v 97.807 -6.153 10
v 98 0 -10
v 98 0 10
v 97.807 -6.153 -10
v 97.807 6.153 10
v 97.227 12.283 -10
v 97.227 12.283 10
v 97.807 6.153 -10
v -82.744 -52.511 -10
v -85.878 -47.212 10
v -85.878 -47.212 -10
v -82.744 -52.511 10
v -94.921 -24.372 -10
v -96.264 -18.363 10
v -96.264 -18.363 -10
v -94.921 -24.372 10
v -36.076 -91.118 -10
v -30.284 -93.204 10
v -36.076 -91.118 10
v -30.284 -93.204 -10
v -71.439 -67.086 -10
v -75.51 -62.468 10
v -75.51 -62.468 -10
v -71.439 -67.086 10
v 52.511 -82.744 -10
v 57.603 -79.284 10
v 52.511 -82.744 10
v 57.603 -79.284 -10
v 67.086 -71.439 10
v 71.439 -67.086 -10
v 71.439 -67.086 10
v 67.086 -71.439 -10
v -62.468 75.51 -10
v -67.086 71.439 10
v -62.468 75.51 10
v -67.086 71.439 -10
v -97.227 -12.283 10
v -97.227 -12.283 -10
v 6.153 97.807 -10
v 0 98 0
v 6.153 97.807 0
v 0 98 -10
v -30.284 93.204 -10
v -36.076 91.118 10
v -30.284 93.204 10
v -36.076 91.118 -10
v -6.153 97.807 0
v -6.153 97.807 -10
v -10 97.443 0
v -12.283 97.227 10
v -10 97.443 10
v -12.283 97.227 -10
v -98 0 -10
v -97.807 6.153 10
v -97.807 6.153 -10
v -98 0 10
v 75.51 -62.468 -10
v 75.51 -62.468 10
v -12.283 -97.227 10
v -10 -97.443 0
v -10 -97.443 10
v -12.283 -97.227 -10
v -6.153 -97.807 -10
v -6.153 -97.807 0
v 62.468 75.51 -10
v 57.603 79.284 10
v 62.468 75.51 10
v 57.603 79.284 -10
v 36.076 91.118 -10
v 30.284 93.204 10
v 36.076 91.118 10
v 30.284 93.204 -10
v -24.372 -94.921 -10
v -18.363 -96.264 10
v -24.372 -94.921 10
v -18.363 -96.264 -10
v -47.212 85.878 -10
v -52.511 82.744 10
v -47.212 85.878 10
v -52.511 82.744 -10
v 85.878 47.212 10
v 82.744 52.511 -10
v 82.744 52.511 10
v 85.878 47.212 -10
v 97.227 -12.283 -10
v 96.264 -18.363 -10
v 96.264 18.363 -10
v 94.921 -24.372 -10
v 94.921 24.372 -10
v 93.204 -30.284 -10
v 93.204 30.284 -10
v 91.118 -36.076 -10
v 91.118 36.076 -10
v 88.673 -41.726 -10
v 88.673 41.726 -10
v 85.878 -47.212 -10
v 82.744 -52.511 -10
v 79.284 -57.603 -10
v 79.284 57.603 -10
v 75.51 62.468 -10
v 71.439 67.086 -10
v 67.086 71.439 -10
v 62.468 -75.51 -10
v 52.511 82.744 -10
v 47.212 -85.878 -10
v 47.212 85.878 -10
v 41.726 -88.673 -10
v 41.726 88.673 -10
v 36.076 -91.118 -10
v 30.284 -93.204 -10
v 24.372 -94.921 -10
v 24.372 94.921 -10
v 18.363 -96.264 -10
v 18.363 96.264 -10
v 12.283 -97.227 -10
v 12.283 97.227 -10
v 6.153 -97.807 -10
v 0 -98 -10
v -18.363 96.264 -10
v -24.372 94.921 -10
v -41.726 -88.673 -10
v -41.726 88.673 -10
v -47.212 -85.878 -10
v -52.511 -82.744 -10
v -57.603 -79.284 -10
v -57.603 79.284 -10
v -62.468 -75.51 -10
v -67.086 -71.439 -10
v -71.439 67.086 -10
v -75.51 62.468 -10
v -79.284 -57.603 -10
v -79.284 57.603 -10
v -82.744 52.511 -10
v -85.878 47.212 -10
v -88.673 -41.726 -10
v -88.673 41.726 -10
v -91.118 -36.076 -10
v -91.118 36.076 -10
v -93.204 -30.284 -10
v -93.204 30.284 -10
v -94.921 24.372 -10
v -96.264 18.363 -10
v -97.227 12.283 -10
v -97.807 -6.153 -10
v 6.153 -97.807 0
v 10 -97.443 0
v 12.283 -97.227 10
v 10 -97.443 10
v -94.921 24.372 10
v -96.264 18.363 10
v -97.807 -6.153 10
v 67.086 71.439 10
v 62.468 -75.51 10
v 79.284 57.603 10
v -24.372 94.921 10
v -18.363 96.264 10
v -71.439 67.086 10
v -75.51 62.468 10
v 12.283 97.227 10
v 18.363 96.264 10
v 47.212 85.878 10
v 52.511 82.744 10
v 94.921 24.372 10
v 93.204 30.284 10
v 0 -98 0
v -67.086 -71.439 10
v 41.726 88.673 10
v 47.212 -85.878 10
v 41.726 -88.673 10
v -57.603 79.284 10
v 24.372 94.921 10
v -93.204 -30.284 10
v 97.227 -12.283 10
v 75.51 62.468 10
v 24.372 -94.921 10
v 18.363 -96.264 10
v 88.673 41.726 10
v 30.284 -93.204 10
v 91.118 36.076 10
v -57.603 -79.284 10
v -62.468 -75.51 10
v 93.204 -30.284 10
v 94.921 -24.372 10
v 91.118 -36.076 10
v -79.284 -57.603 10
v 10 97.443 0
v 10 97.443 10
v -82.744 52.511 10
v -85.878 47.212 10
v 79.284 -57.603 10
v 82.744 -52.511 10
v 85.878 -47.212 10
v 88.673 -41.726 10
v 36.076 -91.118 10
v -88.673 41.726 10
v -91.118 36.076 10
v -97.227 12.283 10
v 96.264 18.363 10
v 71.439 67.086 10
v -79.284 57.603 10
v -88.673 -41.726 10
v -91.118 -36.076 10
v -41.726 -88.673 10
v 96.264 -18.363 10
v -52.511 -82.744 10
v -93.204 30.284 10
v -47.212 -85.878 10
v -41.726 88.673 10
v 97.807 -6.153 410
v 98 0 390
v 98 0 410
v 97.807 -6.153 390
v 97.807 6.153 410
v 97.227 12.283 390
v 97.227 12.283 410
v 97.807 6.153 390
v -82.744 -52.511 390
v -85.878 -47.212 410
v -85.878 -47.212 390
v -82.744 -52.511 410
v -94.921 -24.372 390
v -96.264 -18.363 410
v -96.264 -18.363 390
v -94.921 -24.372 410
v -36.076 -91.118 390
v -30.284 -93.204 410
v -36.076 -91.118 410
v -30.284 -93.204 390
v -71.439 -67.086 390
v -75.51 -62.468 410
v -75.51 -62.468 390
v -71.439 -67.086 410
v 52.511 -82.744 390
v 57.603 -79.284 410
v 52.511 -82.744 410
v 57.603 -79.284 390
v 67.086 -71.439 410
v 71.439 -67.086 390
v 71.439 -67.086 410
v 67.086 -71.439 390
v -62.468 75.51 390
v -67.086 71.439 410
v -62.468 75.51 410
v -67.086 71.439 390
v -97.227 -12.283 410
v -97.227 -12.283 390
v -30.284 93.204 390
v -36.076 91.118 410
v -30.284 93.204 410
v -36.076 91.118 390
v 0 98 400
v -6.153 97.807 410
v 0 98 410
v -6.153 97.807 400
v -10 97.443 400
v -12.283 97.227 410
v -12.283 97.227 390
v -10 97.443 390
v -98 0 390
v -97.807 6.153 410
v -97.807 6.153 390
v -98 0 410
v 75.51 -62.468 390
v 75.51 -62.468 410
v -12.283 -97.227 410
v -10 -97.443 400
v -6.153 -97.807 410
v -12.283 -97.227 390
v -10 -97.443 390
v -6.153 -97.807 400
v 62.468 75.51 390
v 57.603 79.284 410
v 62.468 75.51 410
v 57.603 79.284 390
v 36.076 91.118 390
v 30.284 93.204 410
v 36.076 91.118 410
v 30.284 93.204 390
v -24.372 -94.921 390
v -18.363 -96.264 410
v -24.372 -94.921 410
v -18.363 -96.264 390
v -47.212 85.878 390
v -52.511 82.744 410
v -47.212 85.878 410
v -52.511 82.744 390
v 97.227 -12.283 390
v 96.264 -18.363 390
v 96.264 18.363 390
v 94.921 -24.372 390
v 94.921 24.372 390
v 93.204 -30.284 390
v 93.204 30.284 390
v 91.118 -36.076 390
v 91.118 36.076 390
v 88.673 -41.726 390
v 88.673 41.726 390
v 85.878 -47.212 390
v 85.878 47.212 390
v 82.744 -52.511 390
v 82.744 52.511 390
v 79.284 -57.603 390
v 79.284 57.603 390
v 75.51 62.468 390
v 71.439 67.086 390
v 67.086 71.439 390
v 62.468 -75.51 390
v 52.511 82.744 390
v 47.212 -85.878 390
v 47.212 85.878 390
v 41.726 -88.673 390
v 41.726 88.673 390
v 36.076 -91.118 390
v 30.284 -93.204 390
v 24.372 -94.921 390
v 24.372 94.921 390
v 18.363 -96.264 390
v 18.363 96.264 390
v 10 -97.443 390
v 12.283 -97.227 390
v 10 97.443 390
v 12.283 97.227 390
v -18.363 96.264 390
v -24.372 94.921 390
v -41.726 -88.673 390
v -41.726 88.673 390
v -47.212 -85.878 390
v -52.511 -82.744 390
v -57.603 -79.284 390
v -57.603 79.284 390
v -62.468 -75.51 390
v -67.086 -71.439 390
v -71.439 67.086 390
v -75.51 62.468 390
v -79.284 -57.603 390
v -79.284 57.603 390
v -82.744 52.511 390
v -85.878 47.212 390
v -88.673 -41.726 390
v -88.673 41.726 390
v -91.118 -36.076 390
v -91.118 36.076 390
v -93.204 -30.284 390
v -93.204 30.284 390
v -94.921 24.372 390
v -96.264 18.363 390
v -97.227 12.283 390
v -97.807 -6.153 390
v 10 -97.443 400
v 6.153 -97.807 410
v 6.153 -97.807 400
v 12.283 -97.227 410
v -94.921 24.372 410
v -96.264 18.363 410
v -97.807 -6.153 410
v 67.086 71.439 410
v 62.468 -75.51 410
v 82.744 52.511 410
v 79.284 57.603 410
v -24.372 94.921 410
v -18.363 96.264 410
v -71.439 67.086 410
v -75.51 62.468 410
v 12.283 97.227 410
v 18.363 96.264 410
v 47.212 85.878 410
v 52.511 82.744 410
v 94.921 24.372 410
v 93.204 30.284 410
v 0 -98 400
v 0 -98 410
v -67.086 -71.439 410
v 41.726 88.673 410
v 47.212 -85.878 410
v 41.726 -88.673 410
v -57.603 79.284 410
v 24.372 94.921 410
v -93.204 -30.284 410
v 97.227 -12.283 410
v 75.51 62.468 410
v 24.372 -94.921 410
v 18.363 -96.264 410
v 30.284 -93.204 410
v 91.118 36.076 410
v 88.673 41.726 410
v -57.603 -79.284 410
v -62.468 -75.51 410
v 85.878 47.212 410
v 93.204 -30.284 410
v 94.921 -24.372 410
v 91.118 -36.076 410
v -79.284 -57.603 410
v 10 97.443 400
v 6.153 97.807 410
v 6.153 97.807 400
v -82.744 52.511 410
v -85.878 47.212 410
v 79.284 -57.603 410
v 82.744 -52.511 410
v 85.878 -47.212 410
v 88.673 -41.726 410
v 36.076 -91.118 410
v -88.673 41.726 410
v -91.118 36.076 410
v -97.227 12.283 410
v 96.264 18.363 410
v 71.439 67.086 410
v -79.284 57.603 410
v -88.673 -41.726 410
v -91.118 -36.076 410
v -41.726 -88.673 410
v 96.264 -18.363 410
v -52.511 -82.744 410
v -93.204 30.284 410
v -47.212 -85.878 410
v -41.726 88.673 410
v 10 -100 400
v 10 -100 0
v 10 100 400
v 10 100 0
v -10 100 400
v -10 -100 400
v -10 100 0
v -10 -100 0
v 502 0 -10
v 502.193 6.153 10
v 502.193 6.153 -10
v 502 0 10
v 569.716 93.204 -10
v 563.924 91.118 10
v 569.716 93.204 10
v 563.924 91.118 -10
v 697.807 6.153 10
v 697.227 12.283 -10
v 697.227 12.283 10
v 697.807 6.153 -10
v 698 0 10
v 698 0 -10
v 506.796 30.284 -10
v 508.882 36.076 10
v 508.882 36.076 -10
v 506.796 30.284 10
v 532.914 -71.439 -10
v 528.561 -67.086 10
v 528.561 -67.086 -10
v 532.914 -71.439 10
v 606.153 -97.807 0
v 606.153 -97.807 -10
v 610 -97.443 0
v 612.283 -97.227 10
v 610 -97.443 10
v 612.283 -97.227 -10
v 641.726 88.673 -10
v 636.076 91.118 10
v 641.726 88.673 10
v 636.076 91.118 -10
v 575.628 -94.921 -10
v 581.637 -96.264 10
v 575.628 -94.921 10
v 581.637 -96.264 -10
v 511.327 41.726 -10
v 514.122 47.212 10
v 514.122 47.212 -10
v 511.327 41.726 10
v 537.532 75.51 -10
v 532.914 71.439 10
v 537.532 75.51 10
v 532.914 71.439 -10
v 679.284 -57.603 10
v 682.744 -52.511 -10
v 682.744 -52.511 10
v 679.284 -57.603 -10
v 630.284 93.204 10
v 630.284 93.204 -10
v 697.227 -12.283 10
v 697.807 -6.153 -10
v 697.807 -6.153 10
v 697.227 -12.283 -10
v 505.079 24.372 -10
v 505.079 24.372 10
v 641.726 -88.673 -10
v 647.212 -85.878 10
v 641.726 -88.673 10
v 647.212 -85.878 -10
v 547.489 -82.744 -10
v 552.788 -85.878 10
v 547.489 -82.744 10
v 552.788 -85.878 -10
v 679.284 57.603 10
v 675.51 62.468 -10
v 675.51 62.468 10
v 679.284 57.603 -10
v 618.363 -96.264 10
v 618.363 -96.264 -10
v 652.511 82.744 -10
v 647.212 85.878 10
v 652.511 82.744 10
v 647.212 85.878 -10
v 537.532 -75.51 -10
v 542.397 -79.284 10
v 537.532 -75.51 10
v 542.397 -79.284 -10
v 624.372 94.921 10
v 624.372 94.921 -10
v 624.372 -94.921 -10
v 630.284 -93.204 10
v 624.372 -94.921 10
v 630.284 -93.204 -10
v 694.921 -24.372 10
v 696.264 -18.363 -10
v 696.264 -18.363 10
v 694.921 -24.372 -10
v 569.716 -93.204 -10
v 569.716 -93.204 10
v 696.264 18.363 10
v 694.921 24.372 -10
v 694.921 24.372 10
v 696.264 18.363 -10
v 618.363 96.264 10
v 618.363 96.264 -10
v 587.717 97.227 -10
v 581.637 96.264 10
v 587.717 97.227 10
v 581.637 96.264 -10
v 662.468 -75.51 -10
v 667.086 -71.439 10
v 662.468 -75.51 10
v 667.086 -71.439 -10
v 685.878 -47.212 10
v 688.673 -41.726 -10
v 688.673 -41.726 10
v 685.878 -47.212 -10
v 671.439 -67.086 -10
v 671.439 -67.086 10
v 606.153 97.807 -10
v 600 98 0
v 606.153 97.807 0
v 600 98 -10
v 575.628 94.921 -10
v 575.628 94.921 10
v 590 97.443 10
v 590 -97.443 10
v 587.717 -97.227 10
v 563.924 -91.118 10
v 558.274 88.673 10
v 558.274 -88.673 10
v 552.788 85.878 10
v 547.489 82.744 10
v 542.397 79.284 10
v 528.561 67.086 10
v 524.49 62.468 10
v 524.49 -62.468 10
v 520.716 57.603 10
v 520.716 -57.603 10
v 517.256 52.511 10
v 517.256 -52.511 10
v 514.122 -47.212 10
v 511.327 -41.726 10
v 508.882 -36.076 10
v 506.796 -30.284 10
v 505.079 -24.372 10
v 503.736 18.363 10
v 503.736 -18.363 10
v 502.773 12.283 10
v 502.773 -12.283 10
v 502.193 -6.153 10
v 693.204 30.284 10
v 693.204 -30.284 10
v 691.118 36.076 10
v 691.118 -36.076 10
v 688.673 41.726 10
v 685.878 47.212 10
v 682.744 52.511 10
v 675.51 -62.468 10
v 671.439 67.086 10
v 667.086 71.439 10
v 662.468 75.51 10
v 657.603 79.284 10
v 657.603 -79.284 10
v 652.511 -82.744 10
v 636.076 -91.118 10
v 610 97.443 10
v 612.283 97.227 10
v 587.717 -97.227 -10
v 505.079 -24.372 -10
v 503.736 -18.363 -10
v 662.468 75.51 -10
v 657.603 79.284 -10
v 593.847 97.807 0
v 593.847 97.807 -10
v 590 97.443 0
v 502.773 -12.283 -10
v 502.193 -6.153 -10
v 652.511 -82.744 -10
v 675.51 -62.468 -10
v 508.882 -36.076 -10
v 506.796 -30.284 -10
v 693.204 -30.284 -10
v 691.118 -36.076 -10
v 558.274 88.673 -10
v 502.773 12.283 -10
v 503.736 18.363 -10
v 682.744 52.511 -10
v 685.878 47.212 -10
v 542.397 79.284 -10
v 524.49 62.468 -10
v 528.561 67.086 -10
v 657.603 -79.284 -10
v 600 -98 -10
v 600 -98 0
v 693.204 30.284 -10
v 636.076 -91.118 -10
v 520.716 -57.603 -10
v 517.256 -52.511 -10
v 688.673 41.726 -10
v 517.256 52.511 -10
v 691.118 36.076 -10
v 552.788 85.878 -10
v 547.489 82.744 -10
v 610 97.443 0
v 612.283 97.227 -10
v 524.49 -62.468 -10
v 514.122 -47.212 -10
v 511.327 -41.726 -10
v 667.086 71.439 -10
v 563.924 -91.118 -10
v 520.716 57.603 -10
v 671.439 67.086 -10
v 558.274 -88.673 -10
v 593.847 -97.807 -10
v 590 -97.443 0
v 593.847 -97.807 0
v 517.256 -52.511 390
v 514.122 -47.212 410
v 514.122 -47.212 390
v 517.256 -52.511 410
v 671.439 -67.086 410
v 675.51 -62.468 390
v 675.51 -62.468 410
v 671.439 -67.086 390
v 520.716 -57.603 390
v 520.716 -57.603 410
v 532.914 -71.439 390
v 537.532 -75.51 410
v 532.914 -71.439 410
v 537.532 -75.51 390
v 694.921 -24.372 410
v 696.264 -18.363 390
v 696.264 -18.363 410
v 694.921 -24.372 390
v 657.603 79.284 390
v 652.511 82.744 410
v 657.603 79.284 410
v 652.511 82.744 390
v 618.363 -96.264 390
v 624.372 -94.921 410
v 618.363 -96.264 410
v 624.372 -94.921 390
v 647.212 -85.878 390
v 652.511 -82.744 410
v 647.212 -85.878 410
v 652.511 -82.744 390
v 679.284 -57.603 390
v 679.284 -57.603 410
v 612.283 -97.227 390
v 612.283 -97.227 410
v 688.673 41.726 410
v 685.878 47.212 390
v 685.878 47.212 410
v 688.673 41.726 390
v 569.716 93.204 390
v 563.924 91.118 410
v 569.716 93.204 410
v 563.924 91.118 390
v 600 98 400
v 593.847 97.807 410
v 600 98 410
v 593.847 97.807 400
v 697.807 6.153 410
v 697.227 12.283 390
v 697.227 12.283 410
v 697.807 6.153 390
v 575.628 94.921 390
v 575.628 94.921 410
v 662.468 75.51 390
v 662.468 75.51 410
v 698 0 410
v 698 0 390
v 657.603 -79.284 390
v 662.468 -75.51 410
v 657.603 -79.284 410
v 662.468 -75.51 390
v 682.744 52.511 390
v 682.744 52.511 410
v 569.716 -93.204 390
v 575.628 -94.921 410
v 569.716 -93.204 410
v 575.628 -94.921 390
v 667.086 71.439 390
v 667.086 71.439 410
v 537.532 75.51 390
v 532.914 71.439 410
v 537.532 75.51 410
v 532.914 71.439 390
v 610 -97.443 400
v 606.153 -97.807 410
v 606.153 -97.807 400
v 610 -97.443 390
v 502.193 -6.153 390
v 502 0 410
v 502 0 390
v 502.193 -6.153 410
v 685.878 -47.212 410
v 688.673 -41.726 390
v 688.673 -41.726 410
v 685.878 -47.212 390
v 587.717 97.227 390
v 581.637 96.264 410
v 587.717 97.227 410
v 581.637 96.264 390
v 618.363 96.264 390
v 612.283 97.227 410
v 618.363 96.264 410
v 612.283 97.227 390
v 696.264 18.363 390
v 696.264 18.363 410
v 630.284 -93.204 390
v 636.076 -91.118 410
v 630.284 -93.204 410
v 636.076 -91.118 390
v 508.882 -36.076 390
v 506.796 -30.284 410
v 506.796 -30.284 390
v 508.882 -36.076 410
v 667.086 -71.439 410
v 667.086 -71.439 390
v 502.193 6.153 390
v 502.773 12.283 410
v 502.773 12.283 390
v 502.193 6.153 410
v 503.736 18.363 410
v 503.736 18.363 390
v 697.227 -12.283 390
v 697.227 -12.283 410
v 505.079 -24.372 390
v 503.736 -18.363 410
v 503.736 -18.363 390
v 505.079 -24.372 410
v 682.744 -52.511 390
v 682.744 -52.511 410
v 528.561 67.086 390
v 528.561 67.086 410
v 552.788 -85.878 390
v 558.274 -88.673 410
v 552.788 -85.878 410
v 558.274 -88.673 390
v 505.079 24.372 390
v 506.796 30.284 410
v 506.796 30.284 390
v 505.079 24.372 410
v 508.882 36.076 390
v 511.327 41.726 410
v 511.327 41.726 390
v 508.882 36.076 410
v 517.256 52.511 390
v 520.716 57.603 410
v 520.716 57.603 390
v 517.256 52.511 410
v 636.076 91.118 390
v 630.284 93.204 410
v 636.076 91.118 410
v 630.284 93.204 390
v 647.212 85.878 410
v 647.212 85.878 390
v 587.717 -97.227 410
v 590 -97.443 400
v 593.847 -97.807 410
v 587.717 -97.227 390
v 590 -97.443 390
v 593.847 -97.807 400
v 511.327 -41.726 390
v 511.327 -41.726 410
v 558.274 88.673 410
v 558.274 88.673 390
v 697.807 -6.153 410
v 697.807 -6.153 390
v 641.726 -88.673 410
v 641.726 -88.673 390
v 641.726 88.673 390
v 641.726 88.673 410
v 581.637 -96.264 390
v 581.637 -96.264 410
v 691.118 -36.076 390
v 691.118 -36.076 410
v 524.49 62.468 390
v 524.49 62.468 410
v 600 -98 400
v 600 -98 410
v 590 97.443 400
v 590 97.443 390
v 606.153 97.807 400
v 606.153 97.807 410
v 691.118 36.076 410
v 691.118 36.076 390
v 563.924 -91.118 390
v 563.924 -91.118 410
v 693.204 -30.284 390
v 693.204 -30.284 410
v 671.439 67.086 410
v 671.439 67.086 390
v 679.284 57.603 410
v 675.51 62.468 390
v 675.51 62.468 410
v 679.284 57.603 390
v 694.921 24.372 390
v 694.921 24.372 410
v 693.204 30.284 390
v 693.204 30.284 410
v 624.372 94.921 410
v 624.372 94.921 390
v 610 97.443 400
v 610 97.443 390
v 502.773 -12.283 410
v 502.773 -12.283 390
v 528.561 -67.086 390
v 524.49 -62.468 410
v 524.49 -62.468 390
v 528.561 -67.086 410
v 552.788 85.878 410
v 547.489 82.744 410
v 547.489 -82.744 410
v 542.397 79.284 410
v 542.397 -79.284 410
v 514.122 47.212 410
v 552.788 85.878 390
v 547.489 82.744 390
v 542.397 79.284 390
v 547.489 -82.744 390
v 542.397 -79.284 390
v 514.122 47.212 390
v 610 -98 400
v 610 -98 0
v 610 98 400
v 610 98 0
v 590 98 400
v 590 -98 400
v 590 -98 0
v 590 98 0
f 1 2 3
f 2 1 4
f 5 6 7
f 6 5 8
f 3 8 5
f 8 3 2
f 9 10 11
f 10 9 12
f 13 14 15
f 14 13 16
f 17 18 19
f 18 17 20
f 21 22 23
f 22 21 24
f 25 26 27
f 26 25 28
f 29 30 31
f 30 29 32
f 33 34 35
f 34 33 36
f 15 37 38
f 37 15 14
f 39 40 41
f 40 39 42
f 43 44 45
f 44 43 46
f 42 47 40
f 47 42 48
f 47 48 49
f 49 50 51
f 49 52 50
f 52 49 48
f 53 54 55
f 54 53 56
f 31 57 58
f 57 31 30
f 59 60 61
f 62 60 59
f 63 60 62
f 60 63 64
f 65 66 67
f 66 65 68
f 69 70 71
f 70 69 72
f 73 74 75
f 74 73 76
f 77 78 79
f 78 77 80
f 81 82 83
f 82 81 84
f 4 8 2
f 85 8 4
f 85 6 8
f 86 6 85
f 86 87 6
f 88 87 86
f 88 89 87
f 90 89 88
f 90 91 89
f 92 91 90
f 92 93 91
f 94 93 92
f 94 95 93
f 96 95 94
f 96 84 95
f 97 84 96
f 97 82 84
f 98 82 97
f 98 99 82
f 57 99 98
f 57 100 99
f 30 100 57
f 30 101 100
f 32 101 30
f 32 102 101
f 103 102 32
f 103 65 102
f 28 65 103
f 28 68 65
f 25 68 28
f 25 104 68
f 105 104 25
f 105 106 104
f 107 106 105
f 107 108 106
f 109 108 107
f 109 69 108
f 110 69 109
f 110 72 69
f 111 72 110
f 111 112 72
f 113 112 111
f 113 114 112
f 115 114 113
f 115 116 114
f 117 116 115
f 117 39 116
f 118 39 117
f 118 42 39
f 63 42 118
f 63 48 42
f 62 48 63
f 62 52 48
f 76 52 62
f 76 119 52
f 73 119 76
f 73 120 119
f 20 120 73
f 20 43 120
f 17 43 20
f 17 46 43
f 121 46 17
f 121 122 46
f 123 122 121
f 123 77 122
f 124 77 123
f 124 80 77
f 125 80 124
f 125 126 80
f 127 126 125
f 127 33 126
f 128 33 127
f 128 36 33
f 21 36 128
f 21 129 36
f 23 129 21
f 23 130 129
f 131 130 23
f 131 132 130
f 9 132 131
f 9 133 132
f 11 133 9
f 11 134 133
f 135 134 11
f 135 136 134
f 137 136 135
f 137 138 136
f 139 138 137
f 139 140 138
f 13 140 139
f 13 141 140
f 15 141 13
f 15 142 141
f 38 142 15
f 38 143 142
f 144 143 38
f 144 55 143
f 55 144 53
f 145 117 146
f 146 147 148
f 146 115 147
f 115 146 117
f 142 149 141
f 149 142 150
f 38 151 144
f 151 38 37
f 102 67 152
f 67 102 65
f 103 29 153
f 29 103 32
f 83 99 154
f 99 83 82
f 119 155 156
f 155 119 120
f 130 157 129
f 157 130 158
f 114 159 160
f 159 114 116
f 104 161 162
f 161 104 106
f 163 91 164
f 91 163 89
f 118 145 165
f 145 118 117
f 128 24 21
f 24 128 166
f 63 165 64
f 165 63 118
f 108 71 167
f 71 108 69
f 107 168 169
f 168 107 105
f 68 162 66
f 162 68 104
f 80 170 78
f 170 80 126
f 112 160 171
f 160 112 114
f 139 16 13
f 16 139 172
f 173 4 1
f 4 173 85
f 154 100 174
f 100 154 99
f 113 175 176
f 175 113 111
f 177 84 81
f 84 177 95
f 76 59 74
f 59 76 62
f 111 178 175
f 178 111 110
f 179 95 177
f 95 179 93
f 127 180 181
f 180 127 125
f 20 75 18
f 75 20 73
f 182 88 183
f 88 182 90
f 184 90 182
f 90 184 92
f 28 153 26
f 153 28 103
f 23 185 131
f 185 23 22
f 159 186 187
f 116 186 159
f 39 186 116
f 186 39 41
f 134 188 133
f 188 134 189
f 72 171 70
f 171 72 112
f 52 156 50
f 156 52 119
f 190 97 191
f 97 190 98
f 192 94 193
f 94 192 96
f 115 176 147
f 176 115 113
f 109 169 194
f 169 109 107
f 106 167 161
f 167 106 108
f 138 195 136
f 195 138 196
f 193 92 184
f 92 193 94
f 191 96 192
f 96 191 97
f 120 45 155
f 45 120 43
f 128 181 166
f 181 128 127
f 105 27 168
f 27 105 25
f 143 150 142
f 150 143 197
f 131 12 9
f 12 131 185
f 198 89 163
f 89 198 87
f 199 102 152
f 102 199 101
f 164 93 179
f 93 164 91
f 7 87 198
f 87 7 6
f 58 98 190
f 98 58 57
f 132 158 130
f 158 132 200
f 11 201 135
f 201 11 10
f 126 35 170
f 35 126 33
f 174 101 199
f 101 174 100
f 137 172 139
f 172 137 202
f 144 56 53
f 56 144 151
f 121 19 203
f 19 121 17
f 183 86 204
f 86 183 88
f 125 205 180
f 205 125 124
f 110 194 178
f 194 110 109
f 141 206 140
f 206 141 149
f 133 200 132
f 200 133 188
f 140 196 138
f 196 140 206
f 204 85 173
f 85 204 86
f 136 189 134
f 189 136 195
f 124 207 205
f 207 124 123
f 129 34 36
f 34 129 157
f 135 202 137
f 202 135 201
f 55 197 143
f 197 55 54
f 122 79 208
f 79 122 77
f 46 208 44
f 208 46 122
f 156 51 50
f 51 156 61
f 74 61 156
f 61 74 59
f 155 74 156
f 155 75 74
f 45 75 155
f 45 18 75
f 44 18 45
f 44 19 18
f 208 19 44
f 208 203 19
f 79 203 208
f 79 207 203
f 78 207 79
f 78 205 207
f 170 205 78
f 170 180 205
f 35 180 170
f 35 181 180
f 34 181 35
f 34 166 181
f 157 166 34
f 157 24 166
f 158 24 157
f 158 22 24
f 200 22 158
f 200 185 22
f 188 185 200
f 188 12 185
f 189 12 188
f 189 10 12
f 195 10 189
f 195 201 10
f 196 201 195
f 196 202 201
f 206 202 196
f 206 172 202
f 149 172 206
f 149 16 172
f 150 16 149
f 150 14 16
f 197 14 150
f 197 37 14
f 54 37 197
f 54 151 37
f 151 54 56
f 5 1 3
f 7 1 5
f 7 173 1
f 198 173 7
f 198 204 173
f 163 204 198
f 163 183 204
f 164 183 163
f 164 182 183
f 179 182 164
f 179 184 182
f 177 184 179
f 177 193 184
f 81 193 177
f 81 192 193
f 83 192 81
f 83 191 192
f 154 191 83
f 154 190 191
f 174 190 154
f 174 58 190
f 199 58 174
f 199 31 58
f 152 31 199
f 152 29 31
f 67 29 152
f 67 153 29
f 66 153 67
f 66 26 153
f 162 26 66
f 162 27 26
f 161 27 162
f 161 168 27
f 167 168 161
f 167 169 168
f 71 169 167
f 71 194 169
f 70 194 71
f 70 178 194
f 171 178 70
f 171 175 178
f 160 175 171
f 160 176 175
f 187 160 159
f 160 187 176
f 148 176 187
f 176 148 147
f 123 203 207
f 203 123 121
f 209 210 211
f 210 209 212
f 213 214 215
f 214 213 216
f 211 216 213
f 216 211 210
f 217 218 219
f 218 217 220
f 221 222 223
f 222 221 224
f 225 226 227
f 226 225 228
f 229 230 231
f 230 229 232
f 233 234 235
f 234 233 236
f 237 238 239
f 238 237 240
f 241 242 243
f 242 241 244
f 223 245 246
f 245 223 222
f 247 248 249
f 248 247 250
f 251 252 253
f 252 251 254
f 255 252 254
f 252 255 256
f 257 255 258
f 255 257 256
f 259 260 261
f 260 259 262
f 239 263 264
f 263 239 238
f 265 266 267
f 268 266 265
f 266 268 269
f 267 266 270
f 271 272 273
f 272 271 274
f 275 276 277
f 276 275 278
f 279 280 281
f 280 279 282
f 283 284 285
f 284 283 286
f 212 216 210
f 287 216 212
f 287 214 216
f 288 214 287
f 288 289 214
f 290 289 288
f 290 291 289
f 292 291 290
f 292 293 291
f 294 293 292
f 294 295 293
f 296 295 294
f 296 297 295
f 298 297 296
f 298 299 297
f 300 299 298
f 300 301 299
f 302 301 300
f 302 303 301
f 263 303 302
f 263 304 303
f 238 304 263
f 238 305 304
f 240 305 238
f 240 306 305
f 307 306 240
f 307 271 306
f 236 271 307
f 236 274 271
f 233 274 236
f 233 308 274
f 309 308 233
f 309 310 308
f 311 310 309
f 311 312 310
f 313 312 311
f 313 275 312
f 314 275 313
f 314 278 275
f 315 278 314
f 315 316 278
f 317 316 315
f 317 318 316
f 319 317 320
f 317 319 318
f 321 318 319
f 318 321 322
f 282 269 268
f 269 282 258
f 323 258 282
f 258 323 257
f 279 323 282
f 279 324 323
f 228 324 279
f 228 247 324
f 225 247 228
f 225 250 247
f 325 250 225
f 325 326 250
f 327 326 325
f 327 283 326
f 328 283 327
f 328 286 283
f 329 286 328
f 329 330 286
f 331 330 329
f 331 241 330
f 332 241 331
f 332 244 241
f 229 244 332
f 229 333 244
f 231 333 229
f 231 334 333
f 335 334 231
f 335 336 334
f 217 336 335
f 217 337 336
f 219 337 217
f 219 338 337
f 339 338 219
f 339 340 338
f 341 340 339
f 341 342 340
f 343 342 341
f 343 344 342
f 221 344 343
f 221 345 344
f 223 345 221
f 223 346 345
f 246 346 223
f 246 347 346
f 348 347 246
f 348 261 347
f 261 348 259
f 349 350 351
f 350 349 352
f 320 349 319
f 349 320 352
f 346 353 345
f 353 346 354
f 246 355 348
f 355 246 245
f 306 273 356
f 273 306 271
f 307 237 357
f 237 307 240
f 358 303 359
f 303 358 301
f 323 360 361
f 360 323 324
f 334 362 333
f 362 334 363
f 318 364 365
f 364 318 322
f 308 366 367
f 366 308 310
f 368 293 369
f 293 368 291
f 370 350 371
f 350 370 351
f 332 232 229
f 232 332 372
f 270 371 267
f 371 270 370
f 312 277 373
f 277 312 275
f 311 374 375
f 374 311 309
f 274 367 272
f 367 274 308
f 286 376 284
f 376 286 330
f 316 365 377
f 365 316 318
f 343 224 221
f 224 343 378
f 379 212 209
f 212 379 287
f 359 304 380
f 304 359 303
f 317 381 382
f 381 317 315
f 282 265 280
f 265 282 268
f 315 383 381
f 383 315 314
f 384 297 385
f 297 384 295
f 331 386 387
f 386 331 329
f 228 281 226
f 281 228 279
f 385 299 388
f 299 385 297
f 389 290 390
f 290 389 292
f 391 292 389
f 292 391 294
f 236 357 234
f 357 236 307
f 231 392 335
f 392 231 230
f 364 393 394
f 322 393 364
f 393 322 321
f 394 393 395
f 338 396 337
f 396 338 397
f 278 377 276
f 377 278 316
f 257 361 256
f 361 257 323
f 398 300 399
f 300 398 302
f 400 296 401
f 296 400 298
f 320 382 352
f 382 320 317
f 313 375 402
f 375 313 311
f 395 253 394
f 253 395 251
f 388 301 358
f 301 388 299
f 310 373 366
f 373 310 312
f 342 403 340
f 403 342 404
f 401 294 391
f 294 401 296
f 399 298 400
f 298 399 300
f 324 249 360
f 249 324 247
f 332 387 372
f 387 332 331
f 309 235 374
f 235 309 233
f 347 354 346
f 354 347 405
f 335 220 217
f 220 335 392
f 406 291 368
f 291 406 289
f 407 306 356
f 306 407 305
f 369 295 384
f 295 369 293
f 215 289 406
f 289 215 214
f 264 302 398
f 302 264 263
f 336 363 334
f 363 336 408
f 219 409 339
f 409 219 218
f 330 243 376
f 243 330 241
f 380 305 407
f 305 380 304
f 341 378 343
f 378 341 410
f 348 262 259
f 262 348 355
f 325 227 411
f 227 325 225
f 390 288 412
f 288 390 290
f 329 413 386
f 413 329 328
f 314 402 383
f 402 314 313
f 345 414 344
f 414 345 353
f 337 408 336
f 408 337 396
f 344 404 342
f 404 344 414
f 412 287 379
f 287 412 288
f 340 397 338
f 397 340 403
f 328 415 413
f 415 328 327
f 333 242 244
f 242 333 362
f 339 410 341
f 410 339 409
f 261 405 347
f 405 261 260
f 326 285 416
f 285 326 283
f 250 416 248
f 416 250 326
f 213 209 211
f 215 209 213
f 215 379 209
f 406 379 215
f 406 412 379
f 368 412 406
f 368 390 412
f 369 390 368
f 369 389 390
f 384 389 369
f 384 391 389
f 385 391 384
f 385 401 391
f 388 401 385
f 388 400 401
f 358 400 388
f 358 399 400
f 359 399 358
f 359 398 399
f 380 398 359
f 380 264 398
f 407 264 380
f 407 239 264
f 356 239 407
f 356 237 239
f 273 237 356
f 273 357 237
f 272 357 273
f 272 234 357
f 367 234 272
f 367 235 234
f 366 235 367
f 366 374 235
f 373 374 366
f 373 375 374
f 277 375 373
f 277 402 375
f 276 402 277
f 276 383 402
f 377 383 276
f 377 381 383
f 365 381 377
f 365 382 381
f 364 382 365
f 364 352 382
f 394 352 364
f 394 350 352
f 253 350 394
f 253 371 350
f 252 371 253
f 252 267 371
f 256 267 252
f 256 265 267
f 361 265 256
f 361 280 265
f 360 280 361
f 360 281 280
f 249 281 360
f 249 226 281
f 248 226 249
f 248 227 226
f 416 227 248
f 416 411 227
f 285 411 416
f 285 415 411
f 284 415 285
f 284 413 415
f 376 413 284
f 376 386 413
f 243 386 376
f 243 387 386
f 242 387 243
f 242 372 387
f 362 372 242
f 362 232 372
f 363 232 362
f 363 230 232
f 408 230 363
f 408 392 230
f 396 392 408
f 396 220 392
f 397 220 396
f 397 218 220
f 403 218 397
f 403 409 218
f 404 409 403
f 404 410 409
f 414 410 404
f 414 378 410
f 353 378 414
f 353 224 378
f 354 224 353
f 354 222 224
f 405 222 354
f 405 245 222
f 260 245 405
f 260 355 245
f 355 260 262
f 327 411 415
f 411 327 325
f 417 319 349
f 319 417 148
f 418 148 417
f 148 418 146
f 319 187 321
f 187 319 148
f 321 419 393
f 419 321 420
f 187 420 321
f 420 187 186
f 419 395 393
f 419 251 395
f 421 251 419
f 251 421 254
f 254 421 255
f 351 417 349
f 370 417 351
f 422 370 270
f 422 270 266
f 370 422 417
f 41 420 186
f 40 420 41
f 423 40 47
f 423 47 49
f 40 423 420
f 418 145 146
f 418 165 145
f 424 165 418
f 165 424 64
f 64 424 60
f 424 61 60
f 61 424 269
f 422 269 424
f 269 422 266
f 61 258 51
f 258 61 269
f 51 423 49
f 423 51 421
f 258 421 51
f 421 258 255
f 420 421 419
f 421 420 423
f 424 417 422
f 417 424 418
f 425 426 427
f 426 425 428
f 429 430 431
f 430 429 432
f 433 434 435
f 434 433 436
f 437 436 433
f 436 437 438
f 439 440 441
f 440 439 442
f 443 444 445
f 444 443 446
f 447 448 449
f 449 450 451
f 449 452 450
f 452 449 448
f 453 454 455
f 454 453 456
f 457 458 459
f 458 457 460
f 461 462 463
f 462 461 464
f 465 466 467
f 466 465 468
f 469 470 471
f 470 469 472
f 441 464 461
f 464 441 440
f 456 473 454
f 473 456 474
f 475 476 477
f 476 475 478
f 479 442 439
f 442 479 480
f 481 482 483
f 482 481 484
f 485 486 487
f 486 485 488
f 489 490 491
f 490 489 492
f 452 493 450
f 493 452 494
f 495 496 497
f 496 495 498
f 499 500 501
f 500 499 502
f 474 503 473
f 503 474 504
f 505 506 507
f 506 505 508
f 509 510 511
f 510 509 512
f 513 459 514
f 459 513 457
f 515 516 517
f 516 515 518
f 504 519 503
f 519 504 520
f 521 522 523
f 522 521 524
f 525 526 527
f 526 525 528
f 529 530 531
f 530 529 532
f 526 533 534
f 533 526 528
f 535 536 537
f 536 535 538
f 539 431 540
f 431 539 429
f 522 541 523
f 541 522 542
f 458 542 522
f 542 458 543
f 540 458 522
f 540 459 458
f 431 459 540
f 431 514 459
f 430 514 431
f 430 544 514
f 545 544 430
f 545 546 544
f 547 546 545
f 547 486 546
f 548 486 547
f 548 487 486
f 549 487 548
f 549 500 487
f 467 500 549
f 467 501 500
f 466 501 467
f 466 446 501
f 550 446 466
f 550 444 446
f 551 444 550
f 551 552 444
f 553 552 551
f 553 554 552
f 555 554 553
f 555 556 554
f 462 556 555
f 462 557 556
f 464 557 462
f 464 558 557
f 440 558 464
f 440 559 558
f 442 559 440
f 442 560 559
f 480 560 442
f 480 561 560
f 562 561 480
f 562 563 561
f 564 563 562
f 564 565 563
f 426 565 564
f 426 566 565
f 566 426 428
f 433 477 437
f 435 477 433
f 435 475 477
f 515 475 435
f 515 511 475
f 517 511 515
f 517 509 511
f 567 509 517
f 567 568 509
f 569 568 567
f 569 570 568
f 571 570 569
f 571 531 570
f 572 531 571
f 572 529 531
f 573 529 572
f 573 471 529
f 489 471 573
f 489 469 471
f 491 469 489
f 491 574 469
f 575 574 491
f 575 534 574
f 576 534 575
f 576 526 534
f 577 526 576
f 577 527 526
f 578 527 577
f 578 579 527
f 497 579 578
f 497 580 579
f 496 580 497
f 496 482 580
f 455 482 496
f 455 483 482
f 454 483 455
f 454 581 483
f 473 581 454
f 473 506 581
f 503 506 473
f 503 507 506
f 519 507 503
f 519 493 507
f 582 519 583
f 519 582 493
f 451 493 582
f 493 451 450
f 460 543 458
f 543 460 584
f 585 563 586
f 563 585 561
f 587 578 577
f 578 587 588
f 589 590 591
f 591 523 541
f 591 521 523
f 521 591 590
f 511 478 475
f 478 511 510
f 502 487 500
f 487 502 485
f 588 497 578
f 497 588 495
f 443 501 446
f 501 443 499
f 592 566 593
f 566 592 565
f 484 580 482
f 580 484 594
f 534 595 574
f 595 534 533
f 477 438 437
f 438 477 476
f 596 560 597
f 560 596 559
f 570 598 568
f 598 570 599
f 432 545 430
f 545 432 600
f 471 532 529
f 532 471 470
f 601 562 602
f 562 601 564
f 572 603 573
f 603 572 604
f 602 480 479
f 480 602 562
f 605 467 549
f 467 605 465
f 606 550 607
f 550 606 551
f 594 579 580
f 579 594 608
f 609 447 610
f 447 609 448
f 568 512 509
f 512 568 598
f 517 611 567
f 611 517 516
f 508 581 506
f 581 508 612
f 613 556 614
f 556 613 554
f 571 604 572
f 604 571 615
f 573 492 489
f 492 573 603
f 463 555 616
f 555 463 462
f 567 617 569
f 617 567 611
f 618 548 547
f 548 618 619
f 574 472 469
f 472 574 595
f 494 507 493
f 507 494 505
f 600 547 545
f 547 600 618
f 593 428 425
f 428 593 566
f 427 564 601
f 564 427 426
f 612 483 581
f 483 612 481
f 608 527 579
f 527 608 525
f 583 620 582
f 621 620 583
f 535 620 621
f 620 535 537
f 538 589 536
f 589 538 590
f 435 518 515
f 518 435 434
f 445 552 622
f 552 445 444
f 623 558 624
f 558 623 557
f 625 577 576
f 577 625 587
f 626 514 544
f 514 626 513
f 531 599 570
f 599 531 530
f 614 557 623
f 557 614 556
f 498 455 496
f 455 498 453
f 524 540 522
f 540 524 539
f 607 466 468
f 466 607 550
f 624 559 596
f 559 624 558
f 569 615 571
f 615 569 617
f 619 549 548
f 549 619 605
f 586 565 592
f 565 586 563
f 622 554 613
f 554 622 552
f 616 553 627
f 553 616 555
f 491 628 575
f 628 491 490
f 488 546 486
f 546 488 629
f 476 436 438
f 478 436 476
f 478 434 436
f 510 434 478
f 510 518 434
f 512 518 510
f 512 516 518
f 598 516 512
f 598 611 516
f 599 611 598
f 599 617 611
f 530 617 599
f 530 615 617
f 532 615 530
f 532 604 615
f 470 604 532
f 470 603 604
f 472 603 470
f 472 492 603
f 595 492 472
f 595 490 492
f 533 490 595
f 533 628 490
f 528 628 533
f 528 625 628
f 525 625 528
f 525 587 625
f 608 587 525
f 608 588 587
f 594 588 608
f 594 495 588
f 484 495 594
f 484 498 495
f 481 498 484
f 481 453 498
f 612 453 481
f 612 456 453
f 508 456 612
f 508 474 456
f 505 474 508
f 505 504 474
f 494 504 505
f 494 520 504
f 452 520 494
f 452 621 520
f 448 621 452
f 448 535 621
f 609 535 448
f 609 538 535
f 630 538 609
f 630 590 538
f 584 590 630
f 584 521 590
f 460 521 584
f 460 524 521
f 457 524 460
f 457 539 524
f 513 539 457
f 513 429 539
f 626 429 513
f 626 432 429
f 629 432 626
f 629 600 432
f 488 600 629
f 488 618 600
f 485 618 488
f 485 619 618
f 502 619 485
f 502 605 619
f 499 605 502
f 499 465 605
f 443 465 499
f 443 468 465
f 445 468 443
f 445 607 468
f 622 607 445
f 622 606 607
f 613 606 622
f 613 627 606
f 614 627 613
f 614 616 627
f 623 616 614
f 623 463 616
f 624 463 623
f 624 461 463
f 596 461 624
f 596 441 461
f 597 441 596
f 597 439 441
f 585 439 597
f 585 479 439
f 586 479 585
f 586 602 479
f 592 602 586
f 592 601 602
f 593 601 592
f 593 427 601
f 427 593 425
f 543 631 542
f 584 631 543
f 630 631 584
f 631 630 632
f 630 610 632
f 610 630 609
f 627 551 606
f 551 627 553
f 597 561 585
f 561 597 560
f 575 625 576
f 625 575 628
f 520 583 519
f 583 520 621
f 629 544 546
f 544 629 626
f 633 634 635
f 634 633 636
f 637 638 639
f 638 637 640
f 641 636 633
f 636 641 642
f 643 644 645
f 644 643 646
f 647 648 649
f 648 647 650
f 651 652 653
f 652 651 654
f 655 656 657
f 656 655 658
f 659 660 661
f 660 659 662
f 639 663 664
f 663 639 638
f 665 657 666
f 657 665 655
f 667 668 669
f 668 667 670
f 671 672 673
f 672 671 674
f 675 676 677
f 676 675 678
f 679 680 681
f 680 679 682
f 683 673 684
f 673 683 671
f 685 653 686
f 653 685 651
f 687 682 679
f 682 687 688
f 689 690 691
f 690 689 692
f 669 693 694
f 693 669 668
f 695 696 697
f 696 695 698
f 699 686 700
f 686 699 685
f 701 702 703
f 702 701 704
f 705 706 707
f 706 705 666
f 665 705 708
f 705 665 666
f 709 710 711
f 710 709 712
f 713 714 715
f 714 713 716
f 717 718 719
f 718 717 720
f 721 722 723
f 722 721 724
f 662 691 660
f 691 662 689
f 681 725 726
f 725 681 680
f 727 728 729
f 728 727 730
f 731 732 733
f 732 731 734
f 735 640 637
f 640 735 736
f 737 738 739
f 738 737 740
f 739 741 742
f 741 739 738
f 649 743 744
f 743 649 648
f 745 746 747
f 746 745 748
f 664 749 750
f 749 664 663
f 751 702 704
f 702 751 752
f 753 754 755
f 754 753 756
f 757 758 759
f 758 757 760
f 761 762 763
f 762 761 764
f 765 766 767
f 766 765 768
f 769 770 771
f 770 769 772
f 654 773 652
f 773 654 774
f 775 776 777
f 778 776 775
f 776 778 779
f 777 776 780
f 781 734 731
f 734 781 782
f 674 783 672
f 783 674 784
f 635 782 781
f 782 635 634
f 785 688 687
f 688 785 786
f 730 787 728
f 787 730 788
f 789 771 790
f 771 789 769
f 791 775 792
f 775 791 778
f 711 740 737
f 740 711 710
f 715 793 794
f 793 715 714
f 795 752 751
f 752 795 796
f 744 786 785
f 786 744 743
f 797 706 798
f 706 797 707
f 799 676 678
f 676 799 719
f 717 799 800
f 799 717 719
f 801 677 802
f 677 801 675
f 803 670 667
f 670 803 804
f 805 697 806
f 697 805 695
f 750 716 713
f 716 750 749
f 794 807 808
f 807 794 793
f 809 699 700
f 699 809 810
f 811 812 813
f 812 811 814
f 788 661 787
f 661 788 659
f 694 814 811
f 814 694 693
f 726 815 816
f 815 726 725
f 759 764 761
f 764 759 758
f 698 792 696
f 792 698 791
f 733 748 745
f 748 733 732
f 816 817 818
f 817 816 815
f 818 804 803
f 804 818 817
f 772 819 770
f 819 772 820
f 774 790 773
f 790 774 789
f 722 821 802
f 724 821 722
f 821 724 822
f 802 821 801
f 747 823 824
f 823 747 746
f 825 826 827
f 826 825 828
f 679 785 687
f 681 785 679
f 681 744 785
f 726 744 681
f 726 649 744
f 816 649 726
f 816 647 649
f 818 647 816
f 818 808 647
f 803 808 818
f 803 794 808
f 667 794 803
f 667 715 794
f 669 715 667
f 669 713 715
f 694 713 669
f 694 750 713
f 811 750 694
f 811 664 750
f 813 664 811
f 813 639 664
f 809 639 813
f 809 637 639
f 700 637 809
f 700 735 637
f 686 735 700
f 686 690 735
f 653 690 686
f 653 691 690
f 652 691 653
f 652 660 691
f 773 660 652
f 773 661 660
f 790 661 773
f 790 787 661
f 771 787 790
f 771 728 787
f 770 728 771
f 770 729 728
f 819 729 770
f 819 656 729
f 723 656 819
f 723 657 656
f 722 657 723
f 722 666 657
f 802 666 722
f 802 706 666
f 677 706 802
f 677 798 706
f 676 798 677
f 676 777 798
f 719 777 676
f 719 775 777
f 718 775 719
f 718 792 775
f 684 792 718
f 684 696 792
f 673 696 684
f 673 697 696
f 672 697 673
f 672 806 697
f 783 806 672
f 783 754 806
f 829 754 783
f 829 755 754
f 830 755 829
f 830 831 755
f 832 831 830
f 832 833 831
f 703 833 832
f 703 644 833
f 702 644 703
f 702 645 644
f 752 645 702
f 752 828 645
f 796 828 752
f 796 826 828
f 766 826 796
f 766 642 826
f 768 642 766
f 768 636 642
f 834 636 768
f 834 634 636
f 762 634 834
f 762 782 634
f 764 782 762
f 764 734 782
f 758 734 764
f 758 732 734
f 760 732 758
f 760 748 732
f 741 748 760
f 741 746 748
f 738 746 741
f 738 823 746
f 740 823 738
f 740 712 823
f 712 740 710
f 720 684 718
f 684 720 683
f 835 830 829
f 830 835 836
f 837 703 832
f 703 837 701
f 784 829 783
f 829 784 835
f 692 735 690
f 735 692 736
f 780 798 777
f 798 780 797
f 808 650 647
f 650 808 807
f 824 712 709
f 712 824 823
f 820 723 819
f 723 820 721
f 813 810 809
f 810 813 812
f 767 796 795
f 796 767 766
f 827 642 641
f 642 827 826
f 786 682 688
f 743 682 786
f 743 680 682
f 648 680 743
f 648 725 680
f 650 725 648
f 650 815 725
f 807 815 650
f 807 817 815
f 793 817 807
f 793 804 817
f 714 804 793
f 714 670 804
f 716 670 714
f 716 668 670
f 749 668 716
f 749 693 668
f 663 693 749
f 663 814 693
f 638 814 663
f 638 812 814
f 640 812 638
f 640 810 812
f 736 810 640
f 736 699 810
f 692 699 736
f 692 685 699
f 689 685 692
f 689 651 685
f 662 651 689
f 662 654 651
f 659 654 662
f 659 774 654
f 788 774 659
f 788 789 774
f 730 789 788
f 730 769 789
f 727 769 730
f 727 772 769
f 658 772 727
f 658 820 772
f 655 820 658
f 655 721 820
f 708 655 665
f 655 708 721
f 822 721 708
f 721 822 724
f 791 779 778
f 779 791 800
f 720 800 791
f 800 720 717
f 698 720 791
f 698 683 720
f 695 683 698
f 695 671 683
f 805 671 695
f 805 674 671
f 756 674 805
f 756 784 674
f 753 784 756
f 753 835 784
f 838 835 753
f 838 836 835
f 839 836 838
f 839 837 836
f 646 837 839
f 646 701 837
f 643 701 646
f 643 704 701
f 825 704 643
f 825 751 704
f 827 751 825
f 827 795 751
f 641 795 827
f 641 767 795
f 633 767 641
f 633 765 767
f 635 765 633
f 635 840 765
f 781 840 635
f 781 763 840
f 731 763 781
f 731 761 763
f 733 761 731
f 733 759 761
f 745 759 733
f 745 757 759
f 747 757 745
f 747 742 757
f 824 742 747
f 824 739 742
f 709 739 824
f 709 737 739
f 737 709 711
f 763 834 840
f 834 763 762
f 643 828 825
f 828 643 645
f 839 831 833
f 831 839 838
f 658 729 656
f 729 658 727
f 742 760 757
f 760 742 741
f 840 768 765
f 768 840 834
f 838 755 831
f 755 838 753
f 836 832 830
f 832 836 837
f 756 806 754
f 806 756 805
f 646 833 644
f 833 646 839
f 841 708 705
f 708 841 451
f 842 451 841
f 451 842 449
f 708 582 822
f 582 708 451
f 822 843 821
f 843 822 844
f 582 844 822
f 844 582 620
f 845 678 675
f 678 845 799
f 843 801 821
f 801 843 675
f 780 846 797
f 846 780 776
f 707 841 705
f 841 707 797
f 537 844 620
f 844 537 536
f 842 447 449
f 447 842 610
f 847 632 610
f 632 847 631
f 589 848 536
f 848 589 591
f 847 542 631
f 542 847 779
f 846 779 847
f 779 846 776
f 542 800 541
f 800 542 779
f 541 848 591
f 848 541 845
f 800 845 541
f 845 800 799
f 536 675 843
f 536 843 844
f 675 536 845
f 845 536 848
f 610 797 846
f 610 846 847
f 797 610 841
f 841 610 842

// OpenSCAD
// création support minuterie 
// diamètre fusex = 100mm dont 2mm d'épaisseur soit 98mm de diamètre intérieur
color ("white")
cylinder (h=20,r1=98,r2=98,center = true,$fn=100);
color ("white")
translate ([0,0,400])
          cylinder(h=20,r1=98,r2=98, center = true,$fn=100);
color ("white")
translate([0,0,200])
         cube([20,200,400], true,$fn=100);
         
// création 2ème support minuterie
color ("white")
translate ([600,0,0])
         cylinder (h=20,r1=98,r2=98,center = true,$fn=100);
color ("white")
translate ([600,0,400])
          cylinder(h=20,r1=98,r2=98, center = true,$fn=100);
color ("white")
translate([600,0,200])
         cube([20,196,400], true,$fn=100);
